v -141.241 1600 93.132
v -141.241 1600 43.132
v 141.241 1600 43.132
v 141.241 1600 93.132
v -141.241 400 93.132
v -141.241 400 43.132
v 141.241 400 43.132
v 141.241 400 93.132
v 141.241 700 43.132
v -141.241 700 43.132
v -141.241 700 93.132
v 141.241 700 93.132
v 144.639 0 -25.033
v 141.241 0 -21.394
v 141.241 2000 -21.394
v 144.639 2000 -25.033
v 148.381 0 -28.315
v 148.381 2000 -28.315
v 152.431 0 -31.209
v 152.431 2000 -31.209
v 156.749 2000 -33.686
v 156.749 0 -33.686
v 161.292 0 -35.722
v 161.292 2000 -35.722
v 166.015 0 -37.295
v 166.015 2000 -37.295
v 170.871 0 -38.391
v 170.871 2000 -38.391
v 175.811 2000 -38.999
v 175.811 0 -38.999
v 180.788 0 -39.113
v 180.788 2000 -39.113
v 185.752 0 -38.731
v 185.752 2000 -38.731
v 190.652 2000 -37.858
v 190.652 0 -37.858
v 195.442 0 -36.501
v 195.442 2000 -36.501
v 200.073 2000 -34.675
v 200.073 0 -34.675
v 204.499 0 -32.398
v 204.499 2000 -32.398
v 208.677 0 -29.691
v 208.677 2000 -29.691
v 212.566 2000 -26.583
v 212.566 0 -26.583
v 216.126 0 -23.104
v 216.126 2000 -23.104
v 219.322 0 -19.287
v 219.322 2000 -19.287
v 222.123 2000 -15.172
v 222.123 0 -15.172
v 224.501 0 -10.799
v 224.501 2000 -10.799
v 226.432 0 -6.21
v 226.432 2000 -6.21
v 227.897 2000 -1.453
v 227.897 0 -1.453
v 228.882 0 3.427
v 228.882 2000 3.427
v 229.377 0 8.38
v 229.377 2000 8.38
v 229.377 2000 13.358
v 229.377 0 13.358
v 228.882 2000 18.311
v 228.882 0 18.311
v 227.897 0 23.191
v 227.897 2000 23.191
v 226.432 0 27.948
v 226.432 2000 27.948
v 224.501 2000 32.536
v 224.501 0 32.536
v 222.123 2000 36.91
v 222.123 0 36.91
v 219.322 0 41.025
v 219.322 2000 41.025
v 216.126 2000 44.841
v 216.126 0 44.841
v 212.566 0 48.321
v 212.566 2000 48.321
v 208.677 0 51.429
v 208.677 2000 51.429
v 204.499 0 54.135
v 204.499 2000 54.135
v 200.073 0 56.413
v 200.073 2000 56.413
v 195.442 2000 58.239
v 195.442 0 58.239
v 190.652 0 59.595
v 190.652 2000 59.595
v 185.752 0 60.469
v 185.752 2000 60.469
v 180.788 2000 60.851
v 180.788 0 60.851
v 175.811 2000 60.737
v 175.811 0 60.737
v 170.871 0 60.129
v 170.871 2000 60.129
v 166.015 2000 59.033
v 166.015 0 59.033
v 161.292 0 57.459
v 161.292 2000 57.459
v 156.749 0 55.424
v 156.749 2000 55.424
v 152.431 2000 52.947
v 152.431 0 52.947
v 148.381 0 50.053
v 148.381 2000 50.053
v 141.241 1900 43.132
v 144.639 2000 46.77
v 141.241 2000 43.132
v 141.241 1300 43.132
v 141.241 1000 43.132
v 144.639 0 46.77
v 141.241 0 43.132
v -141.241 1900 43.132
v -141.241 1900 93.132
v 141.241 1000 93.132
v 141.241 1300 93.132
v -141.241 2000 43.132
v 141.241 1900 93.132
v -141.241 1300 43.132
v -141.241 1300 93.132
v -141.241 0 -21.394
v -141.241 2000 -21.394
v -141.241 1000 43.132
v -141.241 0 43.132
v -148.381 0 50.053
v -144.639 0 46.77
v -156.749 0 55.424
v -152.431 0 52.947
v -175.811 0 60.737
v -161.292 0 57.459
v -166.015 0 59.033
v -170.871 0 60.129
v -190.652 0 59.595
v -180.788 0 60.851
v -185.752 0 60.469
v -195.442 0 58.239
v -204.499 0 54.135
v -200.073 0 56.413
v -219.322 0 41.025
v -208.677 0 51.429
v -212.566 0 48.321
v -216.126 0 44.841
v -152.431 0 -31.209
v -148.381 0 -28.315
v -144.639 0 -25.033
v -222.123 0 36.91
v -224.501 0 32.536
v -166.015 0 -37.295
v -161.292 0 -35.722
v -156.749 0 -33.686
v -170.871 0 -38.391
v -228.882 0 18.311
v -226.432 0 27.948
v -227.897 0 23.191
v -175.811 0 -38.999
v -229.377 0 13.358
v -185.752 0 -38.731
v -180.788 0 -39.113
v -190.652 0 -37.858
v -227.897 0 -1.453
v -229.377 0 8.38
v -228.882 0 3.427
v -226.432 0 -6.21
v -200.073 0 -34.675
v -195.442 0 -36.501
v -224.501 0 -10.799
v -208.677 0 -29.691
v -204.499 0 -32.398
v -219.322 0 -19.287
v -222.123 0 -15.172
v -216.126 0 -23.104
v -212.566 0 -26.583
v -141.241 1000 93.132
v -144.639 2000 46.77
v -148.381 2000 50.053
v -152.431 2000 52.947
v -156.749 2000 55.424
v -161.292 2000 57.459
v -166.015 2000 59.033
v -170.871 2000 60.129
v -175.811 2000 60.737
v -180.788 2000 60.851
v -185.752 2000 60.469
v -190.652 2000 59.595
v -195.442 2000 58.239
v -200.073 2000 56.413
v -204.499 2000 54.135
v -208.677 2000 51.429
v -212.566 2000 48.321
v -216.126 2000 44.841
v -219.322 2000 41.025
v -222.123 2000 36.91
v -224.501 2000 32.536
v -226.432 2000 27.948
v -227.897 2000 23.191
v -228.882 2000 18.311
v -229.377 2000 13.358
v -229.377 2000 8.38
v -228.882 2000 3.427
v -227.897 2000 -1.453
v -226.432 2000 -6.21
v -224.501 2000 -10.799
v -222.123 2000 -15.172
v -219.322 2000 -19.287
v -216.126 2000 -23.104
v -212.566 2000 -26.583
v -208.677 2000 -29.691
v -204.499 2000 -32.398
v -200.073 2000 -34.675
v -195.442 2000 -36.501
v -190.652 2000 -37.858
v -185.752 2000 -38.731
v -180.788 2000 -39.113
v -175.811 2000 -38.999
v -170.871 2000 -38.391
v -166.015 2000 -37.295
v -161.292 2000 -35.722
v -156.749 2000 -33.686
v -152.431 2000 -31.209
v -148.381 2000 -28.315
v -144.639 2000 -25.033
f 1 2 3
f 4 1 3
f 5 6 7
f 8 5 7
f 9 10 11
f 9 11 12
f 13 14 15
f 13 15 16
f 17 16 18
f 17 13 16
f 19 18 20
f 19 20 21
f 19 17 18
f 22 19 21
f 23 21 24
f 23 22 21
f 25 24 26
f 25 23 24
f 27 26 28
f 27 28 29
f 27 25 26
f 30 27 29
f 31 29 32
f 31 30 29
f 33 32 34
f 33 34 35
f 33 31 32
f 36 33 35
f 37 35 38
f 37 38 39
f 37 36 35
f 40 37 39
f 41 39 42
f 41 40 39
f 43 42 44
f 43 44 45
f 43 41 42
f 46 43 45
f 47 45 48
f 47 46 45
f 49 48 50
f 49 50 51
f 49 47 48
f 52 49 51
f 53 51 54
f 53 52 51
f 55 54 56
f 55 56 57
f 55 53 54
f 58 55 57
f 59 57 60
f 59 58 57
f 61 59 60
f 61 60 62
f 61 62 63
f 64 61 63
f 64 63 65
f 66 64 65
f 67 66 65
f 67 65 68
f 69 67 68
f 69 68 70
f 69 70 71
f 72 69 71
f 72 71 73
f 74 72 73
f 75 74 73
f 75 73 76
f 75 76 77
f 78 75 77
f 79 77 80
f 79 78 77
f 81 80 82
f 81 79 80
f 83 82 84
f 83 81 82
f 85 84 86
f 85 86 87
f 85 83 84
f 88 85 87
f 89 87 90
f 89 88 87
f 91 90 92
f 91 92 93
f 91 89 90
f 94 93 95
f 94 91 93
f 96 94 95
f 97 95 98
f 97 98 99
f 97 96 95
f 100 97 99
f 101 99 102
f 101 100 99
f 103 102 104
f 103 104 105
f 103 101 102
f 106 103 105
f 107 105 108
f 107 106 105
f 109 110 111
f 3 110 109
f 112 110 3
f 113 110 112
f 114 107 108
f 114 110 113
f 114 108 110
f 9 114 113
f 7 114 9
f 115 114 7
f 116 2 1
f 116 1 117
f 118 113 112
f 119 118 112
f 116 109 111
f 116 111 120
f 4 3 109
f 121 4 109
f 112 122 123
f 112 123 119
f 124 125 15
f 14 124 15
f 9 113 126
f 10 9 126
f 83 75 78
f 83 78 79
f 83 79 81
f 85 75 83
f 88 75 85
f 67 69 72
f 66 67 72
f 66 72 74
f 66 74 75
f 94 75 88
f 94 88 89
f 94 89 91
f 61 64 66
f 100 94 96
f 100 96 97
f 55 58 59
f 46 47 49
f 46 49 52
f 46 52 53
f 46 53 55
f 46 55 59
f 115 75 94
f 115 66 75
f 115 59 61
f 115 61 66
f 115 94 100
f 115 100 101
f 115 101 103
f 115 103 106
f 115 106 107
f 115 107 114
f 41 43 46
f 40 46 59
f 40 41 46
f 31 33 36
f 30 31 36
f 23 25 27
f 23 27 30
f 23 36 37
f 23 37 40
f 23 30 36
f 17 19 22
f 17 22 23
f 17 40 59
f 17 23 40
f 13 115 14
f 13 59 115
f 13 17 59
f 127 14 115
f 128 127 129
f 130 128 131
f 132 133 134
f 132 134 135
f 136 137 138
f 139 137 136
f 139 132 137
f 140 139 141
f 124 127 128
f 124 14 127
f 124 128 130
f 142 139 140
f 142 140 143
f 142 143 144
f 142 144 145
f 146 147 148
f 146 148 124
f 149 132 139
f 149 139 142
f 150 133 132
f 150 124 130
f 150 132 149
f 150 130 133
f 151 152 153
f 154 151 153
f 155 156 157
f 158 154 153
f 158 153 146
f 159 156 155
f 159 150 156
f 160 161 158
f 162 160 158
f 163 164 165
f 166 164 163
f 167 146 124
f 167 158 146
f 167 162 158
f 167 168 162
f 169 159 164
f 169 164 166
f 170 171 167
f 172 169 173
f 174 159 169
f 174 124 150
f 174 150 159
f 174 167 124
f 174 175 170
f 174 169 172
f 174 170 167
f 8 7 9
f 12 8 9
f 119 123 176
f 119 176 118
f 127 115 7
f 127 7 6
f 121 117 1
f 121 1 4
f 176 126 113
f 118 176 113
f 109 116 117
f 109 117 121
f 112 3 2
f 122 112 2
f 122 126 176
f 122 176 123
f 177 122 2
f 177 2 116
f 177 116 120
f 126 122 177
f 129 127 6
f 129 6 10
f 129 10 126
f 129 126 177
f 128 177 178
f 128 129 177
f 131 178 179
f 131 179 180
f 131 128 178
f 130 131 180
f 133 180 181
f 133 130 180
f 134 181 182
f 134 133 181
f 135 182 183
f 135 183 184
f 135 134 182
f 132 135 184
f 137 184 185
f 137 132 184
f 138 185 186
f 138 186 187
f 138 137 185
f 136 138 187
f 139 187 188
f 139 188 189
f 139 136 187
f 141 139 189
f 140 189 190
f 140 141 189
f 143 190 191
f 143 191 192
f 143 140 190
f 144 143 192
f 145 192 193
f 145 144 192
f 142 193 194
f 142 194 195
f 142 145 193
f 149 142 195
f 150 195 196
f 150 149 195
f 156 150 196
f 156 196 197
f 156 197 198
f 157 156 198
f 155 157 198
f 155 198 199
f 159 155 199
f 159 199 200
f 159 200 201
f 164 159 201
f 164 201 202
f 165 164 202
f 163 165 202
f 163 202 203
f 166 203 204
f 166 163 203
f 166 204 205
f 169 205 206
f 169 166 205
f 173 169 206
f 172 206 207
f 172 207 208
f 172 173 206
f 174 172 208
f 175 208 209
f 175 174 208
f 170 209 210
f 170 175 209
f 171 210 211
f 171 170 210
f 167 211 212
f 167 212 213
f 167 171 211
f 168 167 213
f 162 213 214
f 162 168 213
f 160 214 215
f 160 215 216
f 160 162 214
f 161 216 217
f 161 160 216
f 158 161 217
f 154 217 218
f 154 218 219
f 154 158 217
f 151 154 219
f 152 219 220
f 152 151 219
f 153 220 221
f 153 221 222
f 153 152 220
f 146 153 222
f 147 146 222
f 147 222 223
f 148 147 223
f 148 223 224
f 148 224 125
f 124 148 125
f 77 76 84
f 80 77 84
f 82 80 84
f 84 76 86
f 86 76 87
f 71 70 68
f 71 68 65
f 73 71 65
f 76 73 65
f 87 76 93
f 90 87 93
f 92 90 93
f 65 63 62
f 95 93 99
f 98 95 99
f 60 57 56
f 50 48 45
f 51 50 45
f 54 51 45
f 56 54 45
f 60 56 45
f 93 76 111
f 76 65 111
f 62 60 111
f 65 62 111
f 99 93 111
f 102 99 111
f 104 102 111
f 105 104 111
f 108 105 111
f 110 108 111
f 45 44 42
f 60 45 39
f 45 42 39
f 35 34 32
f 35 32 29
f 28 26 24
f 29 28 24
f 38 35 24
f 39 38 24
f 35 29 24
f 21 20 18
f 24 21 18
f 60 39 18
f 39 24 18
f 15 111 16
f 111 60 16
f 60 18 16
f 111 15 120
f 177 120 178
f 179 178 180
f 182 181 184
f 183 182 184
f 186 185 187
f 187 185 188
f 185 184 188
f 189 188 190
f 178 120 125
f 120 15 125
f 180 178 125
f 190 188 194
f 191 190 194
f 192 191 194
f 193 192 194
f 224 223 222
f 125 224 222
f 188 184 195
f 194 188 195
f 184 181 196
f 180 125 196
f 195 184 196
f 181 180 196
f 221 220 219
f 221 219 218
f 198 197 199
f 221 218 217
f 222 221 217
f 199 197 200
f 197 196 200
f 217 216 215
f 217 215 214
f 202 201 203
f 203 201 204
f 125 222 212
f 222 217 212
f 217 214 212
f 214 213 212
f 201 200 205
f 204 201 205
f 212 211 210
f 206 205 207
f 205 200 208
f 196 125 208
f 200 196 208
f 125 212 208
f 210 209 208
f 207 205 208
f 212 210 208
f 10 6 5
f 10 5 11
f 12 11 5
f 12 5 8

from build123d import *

# Parameters (mm, degrees)
EXTRUDE_1_DEPTH = 2000
SKETCH_3_W      = 282.482591868
SKETCH_3_H      = 300
EXTRUDE_2_DEPTH = 50


with BuildPart() as part:
    # 草圖2 → 填料-伸長1 (new body)
    with BuildSketch(Plane(origin=(0, 0, 0), x_dir=(1, 0, 0), z_dir=(0, 1, 0))):
        with BuildLine():
            Line((-141.241295934, 21.394189404), (141.241295934, 21.394189404))
            ThreePointArc((141.241295934, 21.394189404), (229.43942383, -10.868839364), (141.241295934, -43.131868132))
            Line((141.241295934, -43.131868132), (-141.241295934, -43.131868132))
            ThreePointArc((-141.241295934, -43.131868132), (-229.43942383, -10.868839364), (-141.241295934, 21.394189404))
        make_face()
    extrude(amount=EXTRUDE_1_DEPTH)

    # 草圖3 → 填料-伸長2 (add)
    with BuildSketch(Plane.XY.offset(43.131868132)):
        with Locations((0, 550)):
            Rectangle(SKETCH_3_W, SKETCH_3_H)
        with Locations((0, 1150)):
            Rectangle(SKETCH_3_W, SKETCH_3_H)
        with Locations((0, 1750)):
            Rectangle(SKETCH_3_W, SKETCH_3_H)
    extrude(amount=EXTRUDE_2_DEPTH)


solid = part.part
